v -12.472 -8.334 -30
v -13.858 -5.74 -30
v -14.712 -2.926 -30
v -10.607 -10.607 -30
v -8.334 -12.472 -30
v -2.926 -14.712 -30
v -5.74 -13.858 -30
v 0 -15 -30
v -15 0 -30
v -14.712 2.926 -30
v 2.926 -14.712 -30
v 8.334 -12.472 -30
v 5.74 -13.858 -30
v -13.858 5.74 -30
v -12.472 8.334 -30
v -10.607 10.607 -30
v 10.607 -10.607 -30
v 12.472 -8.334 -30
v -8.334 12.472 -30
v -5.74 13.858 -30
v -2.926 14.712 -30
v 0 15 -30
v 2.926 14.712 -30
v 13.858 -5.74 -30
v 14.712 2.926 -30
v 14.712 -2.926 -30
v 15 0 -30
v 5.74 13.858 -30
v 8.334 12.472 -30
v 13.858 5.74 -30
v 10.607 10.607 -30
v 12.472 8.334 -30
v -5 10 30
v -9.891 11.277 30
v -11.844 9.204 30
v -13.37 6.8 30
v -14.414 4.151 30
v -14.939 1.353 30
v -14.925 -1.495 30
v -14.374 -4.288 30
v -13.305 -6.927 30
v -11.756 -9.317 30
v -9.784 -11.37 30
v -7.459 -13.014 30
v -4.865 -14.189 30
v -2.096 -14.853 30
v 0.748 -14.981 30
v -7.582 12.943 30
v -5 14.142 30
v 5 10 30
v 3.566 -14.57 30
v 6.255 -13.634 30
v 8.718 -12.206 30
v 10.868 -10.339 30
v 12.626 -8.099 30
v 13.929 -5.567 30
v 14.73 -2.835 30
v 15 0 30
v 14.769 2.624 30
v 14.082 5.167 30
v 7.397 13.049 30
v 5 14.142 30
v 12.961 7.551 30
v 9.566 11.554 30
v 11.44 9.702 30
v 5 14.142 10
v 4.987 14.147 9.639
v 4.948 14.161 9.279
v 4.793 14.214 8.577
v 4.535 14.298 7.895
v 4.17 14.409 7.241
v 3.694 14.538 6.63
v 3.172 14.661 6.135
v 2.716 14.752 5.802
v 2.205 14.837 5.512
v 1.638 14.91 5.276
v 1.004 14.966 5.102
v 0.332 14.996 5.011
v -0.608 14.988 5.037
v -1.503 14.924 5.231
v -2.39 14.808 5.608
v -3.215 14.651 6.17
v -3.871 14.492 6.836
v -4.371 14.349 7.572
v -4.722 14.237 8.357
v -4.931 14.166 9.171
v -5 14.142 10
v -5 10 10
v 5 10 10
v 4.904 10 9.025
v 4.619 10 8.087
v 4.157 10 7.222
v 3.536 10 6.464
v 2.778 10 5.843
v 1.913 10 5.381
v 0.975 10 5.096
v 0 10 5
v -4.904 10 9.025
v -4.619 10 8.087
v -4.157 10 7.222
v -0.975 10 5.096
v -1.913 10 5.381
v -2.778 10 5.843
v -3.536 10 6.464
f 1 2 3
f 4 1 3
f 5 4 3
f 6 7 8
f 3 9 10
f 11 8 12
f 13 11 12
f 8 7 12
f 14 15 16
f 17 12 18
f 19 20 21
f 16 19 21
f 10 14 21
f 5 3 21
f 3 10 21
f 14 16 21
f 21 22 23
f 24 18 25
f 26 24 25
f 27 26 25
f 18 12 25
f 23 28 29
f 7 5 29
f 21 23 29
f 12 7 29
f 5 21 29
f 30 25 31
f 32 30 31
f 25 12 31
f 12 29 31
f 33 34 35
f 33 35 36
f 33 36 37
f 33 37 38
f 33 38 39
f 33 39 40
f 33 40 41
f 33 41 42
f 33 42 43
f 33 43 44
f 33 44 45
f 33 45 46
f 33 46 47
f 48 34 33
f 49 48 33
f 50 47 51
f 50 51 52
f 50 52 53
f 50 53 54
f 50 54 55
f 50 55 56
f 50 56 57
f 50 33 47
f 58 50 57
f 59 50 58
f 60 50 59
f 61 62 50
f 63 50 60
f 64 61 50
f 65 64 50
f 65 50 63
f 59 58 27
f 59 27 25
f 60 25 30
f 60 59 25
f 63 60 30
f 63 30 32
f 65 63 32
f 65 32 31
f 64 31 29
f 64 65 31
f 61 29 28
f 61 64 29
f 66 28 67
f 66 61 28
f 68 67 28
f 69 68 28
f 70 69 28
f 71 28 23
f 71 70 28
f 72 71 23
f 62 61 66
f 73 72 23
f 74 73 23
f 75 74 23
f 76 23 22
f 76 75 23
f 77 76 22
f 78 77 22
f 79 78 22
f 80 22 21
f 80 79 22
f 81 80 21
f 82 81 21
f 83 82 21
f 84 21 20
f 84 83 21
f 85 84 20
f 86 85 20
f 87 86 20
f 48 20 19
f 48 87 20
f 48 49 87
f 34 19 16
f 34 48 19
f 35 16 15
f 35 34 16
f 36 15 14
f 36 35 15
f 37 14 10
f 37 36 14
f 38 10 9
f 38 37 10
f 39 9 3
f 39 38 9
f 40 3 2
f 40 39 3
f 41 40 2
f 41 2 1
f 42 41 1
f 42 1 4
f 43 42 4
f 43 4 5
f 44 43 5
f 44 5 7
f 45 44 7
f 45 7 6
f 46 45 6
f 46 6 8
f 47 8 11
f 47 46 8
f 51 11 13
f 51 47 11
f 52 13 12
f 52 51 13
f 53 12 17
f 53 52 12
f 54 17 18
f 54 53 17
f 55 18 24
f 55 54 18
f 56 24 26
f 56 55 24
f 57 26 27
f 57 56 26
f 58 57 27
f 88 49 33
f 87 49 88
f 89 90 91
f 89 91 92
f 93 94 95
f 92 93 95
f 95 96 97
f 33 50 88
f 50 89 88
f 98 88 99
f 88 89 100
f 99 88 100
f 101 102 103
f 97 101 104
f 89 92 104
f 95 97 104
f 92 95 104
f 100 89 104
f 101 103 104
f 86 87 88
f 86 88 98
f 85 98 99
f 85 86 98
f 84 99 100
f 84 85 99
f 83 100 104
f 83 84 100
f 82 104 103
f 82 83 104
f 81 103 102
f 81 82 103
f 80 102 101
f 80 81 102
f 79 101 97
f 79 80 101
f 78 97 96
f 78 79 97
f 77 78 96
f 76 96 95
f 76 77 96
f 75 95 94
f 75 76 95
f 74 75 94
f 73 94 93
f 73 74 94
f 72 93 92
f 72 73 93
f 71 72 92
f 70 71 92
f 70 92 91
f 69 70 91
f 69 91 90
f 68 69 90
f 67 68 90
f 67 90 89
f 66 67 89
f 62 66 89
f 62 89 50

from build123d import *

# Parameters (mm, degrees)
SKETCH2_R           = 15
BOSS_EXTRUDE1_DEPTH = 30
CUT_EXTRUDE1_DEPTH  = 5


with BuildPart() as part:
    # Sketch2 → Boss-Extrude1 (new, symmetric)
    with BuildSketch(Plane.XY):
        Circle(SKETCH2_R)
    extrude(amount=BOSS_EXTRUDE1_DEPTH, both=True)

    # Sketch3 → Cut-Extrude1 (cut)
    with BuildSketch(Plane(origin=(0, 15, 0), x_dir=(1, 0, 0), z_dir=(0, 1, 0))):
        with BuildLine():
            Line((-5, -30), (-5, -10))
            ThreePointArc((-5, -10), (0, -5), (5, -10))
            Line((5, -10), (5, -30))
            ThreePointArc((5, -30), (0, -35), (-5, -30))
        make_face()
    extrude(amount=-CUT_EXTRUDE1_DEPTH, mode=Mode.SUBTRACT)


solid = part.part
